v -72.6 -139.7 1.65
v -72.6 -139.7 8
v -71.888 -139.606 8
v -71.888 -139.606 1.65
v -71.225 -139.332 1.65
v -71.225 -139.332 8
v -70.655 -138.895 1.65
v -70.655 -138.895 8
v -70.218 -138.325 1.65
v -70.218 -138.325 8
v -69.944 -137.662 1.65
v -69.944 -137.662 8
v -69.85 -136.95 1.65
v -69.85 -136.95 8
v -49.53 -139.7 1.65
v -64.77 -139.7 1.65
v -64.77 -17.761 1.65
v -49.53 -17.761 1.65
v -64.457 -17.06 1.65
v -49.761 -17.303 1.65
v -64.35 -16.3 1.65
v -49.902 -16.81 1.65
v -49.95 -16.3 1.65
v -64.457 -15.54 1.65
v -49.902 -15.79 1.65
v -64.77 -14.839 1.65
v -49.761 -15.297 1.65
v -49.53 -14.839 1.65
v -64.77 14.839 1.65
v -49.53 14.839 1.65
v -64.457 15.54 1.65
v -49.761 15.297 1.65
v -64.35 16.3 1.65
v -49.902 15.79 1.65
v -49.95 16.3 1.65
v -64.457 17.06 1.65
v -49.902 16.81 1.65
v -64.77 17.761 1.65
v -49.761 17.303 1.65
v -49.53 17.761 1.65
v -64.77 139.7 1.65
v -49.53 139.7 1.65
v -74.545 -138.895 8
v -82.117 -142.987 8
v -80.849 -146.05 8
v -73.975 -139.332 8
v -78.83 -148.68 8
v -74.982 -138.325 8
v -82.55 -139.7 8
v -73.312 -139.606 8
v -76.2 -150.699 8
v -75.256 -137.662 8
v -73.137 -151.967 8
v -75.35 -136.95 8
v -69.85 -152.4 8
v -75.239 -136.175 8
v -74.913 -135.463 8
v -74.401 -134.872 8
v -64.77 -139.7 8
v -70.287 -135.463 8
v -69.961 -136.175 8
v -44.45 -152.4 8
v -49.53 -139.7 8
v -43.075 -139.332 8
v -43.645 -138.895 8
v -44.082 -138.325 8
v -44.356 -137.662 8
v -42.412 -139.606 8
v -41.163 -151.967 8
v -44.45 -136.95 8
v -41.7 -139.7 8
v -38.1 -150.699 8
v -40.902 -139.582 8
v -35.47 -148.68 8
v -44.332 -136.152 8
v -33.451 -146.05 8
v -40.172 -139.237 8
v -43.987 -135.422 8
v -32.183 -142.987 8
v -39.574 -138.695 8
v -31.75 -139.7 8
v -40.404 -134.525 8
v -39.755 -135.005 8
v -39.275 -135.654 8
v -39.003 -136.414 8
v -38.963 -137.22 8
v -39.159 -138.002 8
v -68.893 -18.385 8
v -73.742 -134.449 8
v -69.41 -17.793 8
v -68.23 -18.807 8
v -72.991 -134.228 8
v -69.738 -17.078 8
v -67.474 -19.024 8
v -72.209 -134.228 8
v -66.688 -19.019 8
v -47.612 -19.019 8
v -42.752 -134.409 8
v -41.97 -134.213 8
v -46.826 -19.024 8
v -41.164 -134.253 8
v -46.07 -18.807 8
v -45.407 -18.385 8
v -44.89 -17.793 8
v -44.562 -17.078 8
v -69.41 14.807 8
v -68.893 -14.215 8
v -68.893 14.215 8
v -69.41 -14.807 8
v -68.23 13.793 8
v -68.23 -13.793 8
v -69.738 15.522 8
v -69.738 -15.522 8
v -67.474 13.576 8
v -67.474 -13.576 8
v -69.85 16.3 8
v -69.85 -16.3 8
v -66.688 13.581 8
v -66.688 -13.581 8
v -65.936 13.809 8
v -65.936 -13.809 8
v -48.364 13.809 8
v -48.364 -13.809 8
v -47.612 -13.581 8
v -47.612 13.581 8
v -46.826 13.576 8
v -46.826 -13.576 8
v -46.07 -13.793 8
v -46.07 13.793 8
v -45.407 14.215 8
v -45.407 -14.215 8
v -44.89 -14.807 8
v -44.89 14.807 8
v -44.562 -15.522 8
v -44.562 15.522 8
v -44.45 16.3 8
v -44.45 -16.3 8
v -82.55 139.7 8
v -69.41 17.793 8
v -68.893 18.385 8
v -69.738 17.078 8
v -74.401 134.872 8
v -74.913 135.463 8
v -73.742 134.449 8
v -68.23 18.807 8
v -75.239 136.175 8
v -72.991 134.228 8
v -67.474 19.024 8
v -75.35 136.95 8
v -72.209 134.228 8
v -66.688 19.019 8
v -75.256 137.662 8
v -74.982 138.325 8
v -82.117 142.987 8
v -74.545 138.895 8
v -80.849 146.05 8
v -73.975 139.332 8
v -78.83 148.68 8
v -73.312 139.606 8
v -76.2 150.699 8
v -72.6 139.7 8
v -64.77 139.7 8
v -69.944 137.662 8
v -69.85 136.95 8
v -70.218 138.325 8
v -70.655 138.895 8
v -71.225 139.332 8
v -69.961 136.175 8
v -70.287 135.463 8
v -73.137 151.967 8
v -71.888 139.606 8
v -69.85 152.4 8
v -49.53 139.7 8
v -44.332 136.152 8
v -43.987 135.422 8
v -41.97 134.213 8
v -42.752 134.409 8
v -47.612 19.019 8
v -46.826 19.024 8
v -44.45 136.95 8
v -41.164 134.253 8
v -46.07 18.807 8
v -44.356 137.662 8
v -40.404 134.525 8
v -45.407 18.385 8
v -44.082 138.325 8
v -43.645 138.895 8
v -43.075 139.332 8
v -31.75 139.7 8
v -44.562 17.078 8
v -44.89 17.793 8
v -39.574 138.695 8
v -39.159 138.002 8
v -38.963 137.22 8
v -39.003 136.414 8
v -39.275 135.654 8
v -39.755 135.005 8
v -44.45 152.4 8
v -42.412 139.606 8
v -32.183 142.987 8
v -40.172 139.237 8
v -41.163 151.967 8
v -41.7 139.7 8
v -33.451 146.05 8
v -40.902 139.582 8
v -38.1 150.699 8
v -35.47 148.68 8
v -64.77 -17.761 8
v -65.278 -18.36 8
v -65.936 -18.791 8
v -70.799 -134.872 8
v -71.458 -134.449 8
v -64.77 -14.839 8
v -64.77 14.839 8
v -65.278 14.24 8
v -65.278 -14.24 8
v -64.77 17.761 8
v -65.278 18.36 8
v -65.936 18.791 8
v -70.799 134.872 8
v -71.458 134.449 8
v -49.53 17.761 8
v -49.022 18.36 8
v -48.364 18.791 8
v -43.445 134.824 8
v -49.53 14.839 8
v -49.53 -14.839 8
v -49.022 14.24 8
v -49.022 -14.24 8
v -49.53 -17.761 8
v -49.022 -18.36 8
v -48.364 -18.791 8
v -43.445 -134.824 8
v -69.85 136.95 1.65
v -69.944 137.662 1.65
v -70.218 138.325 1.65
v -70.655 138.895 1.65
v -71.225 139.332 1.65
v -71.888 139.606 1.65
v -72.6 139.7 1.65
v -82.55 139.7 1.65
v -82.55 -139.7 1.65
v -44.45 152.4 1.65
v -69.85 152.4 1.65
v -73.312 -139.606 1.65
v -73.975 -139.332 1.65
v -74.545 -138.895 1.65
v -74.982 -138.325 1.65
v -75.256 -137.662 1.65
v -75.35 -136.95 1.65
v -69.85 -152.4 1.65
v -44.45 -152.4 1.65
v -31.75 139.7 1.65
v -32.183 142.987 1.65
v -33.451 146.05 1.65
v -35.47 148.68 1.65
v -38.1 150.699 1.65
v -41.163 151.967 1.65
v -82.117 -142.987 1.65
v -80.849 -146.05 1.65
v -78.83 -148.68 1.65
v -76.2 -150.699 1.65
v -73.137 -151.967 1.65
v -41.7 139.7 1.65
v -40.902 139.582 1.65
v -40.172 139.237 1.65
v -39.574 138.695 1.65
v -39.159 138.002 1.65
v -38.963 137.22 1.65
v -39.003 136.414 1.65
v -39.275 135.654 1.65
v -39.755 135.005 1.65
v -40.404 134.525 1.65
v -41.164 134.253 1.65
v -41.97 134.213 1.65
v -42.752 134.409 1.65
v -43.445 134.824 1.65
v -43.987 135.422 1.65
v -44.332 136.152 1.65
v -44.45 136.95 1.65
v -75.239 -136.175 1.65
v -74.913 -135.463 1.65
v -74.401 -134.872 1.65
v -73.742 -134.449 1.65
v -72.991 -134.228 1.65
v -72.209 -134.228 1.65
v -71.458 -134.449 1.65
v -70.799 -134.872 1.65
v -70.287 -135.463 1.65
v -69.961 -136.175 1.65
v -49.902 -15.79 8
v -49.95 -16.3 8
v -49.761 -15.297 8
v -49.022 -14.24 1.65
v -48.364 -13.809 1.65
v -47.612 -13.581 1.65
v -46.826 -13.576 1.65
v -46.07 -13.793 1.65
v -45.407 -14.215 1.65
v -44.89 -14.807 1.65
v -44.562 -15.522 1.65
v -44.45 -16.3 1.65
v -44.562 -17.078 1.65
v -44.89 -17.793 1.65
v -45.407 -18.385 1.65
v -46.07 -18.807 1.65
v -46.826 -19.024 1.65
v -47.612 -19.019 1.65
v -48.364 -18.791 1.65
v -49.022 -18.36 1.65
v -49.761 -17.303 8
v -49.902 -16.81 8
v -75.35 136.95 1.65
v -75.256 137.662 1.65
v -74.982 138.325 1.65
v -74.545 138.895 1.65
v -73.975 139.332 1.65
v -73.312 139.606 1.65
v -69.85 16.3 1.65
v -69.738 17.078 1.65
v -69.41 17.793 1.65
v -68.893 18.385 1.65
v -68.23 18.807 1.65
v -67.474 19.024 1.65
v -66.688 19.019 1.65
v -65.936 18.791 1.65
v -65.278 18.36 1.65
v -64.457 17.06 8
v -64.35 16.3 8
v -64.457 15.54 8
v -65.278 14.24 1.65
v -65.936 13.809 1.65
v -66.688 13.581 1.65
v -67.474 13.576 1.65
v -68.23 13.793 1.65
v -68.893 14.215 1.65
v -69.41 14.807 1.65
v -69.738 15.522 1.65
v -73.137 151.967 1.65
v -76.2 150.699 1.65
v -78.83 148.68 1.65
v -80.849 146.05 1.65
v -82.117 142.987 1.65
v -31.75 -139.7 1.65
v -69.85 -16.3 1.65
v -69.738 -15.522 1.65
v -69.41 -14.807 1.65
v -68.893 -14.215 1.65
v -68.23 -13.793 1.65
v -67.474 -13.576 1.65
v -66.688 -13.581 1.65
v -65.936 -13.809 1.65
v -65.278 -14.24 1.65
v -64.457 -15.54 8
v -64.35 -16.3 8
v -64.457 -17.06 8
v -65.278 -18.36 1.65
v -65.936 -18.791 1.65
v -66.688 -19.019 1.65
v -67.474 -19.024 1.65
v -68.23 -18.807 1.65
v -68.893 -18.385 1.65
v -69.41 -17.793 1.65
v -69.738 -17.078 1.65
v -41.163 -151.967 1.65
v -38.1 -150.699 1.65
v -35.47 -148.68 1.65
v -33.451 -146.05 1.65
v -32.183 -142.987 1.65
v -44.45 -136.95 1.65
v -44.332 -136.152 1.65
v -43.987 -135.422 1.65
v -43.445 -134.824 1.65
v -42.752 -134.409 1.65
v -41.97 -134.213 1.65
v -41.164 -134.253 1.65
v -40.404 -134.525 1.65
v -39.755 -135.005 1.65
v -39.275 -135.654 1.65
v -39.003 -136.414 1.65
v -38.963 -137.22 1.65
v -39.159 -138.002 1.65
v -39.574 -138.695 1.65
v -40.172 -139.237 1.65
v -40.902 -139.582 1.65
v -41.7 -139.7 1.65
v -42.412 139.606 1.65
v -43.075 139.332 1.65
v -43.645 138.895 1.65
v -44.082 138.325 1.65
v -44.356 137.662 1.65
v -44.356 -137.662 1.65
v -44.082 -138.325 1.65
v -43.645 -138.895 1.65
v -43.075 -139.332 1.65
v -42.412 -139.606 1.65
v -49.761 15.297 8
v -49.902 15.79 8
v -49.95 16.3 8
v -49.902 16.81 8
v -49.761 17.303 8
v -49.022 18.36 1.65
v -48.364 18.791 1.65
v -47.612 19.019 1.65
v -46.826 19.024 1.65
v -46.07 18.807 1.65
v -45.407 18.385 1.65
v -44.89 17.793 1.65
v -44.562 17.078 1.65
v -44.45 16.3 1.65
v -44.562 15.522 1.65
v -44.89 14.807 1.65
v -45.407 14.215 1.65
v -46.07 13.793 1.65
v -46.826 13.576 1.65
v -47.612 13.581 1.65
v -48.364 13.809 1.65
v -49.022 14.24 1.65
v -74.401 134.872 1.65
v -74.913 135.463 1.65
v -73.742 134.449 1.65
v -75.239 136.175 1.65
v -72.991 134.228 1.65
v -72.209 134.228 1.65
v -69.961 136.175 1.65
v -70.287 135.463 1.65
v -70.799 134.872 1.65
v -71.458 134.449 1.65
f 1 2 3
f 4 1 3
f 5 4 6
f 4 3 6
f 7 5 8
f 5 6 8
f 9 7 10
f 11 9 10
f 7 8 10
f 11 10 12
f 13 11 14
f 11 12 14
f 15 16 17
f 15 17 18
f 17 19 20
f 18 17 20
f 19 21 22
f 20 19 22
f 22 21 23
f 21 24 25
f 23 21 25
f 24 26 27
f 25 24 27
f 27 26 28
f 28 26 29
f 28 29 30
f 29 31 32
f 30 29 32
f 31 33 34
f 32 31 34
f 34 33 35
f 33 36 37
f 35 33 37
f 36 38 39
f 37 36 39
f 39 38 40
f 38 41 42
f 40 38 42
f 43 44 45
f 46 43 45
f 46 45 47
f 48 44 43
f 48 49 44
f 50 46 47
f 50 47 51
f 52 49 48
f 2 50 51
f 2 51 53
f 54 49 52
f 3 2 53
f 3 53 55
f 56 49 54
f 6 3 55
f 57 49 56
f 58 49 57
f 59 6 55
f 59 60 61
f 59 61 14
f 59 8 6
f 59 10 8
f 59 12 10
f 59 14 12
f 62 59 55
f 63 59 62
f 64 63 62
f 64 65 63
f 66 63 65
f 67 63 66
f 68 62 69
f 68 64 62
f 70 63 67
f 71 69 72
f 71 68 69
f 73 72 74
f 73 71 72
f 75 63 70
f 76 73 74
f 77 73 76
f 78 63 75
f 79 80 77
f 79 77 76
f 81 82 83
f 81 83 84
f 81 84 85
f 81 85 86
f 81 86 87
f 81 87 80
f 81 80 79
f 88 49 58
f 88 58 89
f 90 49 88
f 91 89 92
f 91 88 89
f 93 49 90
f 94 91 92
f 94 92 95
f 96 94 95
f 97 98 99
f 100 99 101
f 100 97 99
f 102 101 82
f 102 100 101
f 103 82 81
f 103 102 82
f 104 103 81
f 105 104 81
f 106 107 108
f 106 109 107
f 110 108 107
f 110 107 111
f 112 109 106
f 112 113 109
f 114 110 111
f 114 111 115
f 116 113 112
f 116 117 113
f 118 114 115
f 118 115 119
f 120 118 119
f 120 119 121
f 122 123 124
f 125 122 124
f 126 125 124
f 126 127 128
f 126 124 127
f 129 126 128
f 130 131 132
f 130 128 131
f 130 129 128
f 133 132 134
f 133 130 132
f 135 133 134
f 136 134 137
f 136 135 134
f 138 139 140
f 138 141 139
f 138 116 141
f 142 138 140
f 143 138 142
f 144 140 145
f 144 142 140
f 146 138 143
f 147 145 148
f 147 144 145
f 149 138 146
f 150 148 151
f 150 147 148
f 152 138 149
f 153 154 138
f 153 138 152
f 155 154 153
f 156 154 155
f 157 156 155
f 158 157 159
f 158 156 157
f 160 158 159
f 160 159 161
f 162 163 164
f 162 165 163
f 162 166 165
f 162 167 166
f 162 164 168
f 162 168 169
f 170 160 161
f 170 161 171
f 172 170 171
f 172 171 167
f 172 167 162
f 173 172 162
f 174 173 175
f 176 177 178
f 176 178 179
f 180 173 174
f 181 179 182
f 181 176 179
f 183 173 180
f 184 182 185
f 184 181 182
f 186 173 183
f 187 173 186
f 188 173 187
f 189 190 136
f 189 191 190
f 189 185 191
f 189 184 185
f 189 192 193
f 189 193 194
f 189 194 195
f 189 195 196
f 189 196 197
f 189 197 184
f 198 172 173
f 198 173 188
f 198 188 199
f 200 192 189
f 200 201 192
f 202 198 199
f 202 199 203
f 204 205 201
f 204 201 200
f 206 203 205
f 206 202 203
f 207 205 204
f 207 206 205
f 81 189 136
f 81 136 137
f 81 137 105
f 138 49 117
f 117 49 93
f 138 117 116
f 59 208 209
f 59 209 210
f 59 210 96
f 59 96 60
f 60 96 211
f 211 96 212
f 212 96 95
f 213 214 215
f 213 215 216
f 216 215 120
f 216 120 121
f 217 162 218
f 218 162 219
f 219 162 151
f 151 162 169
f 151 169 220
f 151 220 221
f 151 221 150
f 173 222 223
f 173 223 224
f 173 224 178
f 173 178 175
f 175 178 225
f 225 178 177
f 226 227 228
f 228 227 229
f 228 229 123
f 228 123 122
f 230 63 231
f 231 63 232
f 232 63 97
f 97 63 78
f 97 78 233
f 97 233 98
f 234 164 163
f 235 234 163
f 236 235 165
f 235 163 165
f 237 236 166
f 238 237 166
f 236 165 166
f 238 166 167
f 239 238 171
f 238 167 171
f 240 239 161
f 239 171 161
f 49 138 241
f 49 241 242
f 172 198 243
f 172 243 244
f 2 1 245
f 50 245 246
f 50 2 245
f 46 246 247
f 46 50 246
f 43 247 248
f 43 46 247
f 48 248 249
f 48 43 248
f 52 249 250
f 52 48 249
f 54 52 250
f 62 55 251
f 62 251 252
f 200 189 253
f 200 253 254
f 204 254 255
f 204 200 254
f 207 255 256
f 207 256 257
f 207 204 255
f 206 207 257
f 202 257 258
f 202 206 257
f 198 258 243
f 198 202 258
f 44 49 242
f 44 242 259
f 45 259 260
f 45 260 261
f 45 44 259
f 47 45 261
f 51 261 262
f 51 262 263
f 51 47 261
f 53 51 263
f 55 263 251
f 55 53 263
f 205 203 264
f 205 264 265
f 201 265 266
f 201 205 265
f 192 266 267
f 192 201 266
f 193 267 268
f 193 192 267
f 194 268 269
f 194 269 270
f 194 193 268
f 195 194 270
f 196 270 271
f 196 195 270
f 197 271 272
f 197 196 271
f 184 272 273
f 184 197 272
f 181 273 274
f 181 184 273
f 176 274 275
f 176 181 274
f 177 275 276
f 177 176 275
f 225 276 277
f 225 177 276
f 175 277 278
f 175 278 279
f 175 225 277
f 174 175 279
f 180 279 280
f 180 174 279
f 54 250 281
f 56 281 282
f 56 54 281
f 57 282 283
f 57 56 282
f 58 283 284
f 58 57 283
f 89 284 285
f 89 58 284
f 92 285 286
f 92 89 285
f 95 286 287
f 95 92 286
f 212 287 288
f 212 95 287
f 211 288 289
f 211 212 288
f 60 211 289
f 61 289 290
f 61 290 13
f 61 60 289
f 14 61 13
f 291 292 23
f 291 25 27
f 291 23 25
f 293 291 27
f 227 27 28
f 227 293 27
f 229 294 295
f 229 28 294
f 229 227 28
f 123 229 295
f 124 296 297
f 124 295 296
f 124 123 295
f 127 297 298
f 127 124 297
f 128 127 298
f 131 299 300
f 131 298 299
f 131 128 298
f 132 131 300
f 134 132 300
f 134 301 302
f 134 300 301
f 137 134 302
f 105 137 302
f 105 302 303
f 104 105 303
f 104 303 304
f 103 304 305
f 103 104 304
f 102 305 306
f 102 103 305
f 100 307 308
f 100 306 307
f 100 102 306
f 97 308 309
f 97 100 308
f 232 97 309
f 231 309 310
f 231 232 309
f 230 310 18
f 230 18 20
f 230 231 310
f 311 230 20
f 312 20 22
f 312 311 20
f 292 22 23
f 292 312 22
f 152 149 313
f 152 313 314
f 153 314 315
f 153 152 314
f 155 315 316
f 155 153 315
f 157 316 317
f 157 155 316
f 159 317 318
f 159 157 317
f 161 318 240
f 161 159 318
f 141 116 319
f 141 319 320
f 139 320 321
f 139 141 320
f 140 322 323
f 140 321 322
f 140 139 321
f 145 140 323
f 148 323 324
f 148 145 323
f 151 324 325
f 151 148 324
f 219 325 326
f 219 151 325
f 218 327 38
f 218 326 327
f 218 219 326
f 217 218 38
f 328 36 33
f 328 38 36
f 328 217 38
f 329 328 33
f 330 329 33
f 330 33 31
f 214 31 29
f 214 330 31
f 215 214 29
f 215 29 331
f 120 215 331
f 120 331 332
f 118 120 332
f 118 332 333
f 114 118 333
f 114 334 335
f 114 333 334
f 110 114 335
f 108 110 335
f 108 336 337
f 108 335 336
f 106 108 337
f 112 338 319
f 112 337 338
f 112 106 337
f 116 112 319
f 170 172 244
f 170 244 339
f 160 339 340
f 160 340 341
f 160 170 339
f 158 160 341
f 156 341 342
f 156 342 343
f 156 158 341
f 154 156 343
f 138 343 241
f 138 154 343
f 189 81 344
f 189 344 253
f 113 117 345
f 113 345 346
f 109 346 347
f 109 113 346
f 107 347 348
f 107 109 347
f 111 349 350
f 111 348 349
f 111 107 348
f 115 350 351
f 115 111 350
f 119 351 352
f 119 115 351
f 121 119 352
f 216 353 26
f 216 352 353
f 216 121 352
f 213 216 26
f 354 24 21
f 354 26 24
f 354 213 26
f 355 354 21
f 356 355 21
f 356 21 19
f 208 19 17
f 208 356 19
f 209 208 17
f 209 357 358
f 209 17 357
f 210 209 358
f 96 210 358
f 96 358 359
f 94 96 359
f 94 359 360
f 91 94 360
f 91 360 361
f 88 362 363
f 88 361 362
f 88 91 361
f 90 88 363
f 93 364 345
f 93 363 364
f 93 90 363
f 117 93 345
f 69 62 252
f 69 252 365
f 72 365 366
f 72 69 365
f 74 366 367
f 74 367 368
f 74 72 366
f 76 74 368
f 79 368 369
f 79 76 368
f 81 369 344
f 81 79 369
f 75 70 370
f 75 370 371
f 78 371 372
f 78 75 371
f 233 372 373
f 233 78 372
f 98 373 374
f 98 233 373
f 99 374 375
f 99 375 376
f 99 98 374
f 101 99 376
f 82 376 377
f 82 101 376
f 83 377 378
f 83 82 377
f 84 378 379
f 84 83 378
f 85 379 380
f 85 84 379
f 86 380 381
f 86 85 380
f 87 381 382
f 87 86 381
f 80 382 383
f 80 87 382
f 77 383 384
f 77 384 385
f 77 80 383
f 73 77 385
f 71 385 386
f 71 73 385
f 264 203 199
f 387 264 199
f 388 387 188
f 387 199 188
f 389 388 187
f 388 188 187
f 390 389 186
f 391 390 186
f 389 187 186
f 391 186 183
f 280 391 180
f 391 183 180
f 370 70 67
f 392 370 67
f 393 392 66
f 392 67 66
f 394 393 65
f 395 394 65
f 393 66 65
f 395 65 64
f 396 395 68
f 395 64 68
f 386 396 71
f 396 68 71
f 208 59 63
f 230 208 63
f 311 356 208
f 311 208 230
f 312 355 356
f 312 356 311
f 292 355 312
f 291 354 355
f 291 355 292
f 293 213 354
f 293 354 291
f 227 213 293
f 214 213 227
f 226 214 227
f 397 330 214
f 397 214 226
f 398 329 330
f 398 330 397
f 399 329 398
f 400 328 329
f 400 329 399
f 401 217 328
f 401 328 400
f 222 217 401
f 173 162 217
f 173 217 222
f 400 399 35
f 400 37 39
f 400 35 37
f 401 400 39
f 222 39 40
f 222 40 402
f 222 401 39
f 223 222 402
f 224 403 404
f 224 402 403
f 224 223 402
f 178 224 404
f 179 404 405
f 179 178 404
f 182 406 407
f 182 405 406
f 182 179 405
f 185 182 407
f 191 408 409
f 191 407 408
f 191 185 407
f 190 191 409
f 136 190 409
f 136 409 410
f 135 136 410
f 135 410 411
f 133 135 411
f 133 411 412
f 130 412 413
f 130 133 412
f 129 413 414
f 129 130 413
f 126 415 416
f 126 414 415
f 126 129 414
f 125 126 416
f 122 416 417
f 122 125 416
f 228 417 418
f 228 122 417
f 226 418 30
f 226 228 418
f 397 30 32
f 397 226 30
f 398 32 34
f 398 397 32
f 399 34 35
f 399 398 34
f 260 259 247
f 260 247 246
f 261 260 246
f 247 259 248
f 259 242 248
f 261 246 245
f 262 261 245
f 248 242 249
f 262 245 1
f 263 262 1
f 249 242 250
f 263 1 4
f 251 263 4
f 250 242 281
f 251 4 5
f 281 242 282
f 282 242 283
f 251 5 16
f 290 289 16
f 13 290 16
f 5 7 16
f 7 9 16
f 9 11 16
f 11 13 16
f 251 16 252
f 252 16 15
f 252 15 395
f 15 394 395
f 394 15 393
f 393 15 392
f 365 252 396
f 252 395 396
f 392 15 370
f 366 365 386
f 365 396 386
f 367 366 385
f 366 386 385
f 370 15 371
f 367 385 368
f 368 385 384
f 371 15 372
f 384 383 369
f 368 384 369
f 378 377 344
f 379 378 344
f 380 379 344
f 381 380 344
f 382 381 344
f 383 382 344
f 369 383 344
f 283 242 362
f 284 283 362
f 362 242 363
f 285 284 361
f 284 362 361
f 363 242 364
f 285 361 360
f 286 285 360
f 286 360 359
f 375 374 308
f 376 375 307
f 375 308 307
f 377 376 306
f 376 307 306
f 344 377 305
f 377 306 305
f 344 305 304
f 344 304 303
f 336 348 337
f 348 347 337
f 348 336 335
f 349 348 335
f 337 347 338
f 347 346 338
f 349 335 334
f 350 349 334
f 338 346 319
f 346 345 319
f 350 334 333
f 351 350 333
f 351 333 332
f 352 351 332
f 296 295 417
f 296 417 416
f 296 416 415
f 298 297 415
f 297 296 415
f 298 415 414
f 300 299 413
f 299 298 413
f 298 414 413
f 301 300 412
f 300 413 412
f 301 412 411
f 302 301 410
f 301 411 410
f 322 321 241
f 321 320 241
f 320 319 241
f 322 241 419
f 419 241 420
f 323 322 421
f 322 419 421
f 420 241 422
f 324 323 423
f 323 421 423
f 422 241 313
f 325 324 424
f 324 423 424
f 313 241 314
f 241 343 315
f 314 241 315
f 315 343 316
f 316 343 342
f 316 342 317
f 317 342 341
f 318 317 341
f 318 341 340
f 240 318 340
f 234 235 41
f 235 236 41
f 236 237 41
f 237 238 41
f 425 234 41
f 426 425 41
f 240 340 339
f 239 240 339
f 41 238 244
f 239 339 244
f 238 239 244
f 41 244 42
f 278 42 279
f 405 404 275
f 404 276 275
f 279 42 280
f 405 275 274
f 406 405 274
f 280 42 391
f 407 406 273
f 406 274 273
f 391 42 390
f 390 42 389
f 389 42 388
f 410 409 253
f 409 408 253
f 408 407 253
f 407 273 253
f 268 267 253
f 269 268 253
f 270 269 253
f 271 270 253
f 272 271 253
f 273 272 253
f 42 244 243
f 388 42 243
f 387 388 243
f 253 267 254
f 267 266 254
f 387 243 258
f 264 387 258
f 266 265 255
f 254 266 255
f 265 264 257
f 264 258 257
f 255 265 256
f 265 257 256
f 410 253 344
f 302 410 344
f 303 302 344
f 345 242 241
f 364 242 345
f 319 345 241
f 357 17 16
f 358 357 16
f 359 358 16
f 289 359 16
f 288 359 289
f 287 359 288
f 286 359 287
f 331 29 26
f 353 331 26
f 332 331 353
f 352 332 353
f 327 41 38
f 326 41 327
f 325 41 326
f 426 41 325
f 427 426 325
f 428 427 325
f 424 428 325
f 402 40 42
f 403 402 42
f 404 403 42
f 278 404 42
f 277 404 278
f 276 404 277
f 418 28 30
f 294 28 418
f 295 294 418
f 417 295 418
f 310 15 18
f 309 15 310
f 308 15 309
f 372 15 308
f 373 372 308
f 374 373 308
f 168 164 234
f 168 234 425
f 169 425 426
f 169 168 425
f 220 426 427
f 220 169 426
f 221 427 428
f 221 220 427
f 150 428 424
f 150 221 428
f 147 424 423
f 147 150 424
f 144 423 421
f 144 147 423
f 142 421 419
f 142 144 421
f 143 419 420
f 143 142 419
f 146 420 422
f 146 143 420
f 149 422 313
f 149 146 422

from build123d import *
from build123d.topology import SkipClean

# Parameters (mm, degrees)
SKETCH1_W               = 15.24
SKETCH1_H               = 279.4
BOSS_EXTRUDE3_DEPTH     = 6.35
SKETCH2_R               = 2.75
CUT_EXTRUDE1_DEPTH      = 174.437553604
SKETCH3_W               = 15.24
SKETCH3_H               = 279.4
BOSS_EXTRUDE4_DEPTH     = 6.35
CUT_EXTRUDE2_DEPTH      = 174.437553604
CUT_EXTRUDE2_DEPTH_BACK = 174.437553604
SKETCH4_R               = 2.75


with BuildPart() as part:
    # Sketch1 → Boss-Extrude3 (new body)
    with BuildSketch(Plane.XY.offset(8)):
        with BuildLine():
            Line((-69.85, -152.4), (-44.45, -152.4))
            ThreePointArc((-44.45, -152.4), (-35.469743879, -148.680256121), (-31.75, -139.7))
            Line((-31.75, -139.7), (-31.75, 139.7))
            ThreePointArc((-31.75, 139.7), (-35.469743879, 148.680256121), (-44.45, 152.4))
            Line((-44.45, 152.4), (-69.85, 152.4))
            ThreePointArc((-69.85, 152.4), (-78.830256121, 148.680256121), (-82.55, 139.7))
            Line((-82.55, 139.7), (-82.55, -139.7))
            ThreePointArc((-82.55, -139.7), (-78.830256121, -148.680256121), (-69.85, -152.4))
        make_face()
        with Locations((-57.15, 0)):
            Rectangle(SKETCH1_W, SKETCH1_H, mode=Mode.SUBTRACT)
        with BuildLine():
            ThreePointArc((-44.45, -136.95), (-39.755456352, -135.005456352), (-41.7, -139.7))
            ThreePointArc((-41.7, -139.7), (-42.505456352, -137.755456352), (-44.45, -136.95))
        make_face(mode=Mode.SUBTRACT)
        with BuildLine():
            ThreePointArc((-72.6, -139.7), (-74.544543648, -135.005456352), (-69.85, -136.95))
            ThreePointArc((-69.85, -136.95), (-71.794543648, -137.755456352), (-72.6, -139.7))
        make_face(mode=Mode.SUBTRACT)
        with BuildLine():
            ThreePointArc((-41.7, 139.7), (-39.755456352, 135.005456352), (-44.45, 136.95))
            ThreePointArc((-44.45, 136.95), (-42.505456352, 137.755456352), (-41.7, 139.7))
        make_face(mode=Mode.SUBTRACT)
        with BuildLine():
            ThreePointArc((-69.85, 136.95), (-74.544543648, 135.005456352), (-72.6, 139.7))
            ThreePointArc((-72.6, 139.7), (-71.794543648, 137.755456352), (-69.85, 136.95))
        make_face(mode=Mode.SUBTRACT)
    extrude(amount=-BOSS_EXTRUDE3_DEPTH)

    # Sketch2 → Cut-Extrude1 (cut, through all)
    with SkipClean():  # the faces are left unmerged after this step: merging them gives an invalid solid
        with BuildSketch(Plane.XY.offset(8)):
            with Locations(Location((-41.7, 136.95, 0), (0, 0, 180))):
                Circle(SKETCH2_R)
            with Locations(Location((-72.6, 136.95, 0), (0, 0, 180))):
                Circle(SKETCH2_R)
            with Locations(Location((-41.7, -136.95, 0), (0, 0, 180))):
                Circle(SKETCH2_R)
            with Locations(Location((-72.6, -136.95, 0), (0, 0, 180))):
                Circle(SKETCH2_R)
        extrude(amount=-CUT_EXTRUDE1_DEPTH, mode=Mode.SUBTRACT)

    # Sketch3 → Boss-Extrude4 (add)
    with SkipClean():  # the faces are left unmerged after this step: merging them gives an invalid solid
        with BuildSketch(Plane.XY.offset(8)):
            with Locations((-57.15, 0)):
                Rectangle(SKETCH3_W, SKETCH3_H)
        extrude(amount=-BOSS_EXTRUDE4_DEPTH)

    # Sketch4 → Cut-Extrude2 (cut, two sides: drawn at the far end of the back side and taken through both)
    with SkipClean():  # the faces are left unmerged after this step: merging them gives an invalid solid
        with BuildSketch(Plane(origin=(0, 0, 1.65), x_dir=(-1, 0, 0), z_dir=(0, 0, -1)).offset(-CUT_EXTRUDE2_DEPTH_BACK)):
            with Locations((47.2, 16.3)):
                Circle(SKETCH4_R)
            with Locations((67.1, 16.3)):
                Circle(SKETCH4_R)
            with Locations((47.2, -16.3)):
                Circle(SKETCH4_R)
            with Locations((67.1, -16.3)):
                Circle(SKETCH4_R)
        extrude(amount=CUT_EXTRUDE2_DEPTH + CUT_EXTRUDE2_DEPTH_BACK, mode=Mode.SUBTRACT)


solid = part.part
